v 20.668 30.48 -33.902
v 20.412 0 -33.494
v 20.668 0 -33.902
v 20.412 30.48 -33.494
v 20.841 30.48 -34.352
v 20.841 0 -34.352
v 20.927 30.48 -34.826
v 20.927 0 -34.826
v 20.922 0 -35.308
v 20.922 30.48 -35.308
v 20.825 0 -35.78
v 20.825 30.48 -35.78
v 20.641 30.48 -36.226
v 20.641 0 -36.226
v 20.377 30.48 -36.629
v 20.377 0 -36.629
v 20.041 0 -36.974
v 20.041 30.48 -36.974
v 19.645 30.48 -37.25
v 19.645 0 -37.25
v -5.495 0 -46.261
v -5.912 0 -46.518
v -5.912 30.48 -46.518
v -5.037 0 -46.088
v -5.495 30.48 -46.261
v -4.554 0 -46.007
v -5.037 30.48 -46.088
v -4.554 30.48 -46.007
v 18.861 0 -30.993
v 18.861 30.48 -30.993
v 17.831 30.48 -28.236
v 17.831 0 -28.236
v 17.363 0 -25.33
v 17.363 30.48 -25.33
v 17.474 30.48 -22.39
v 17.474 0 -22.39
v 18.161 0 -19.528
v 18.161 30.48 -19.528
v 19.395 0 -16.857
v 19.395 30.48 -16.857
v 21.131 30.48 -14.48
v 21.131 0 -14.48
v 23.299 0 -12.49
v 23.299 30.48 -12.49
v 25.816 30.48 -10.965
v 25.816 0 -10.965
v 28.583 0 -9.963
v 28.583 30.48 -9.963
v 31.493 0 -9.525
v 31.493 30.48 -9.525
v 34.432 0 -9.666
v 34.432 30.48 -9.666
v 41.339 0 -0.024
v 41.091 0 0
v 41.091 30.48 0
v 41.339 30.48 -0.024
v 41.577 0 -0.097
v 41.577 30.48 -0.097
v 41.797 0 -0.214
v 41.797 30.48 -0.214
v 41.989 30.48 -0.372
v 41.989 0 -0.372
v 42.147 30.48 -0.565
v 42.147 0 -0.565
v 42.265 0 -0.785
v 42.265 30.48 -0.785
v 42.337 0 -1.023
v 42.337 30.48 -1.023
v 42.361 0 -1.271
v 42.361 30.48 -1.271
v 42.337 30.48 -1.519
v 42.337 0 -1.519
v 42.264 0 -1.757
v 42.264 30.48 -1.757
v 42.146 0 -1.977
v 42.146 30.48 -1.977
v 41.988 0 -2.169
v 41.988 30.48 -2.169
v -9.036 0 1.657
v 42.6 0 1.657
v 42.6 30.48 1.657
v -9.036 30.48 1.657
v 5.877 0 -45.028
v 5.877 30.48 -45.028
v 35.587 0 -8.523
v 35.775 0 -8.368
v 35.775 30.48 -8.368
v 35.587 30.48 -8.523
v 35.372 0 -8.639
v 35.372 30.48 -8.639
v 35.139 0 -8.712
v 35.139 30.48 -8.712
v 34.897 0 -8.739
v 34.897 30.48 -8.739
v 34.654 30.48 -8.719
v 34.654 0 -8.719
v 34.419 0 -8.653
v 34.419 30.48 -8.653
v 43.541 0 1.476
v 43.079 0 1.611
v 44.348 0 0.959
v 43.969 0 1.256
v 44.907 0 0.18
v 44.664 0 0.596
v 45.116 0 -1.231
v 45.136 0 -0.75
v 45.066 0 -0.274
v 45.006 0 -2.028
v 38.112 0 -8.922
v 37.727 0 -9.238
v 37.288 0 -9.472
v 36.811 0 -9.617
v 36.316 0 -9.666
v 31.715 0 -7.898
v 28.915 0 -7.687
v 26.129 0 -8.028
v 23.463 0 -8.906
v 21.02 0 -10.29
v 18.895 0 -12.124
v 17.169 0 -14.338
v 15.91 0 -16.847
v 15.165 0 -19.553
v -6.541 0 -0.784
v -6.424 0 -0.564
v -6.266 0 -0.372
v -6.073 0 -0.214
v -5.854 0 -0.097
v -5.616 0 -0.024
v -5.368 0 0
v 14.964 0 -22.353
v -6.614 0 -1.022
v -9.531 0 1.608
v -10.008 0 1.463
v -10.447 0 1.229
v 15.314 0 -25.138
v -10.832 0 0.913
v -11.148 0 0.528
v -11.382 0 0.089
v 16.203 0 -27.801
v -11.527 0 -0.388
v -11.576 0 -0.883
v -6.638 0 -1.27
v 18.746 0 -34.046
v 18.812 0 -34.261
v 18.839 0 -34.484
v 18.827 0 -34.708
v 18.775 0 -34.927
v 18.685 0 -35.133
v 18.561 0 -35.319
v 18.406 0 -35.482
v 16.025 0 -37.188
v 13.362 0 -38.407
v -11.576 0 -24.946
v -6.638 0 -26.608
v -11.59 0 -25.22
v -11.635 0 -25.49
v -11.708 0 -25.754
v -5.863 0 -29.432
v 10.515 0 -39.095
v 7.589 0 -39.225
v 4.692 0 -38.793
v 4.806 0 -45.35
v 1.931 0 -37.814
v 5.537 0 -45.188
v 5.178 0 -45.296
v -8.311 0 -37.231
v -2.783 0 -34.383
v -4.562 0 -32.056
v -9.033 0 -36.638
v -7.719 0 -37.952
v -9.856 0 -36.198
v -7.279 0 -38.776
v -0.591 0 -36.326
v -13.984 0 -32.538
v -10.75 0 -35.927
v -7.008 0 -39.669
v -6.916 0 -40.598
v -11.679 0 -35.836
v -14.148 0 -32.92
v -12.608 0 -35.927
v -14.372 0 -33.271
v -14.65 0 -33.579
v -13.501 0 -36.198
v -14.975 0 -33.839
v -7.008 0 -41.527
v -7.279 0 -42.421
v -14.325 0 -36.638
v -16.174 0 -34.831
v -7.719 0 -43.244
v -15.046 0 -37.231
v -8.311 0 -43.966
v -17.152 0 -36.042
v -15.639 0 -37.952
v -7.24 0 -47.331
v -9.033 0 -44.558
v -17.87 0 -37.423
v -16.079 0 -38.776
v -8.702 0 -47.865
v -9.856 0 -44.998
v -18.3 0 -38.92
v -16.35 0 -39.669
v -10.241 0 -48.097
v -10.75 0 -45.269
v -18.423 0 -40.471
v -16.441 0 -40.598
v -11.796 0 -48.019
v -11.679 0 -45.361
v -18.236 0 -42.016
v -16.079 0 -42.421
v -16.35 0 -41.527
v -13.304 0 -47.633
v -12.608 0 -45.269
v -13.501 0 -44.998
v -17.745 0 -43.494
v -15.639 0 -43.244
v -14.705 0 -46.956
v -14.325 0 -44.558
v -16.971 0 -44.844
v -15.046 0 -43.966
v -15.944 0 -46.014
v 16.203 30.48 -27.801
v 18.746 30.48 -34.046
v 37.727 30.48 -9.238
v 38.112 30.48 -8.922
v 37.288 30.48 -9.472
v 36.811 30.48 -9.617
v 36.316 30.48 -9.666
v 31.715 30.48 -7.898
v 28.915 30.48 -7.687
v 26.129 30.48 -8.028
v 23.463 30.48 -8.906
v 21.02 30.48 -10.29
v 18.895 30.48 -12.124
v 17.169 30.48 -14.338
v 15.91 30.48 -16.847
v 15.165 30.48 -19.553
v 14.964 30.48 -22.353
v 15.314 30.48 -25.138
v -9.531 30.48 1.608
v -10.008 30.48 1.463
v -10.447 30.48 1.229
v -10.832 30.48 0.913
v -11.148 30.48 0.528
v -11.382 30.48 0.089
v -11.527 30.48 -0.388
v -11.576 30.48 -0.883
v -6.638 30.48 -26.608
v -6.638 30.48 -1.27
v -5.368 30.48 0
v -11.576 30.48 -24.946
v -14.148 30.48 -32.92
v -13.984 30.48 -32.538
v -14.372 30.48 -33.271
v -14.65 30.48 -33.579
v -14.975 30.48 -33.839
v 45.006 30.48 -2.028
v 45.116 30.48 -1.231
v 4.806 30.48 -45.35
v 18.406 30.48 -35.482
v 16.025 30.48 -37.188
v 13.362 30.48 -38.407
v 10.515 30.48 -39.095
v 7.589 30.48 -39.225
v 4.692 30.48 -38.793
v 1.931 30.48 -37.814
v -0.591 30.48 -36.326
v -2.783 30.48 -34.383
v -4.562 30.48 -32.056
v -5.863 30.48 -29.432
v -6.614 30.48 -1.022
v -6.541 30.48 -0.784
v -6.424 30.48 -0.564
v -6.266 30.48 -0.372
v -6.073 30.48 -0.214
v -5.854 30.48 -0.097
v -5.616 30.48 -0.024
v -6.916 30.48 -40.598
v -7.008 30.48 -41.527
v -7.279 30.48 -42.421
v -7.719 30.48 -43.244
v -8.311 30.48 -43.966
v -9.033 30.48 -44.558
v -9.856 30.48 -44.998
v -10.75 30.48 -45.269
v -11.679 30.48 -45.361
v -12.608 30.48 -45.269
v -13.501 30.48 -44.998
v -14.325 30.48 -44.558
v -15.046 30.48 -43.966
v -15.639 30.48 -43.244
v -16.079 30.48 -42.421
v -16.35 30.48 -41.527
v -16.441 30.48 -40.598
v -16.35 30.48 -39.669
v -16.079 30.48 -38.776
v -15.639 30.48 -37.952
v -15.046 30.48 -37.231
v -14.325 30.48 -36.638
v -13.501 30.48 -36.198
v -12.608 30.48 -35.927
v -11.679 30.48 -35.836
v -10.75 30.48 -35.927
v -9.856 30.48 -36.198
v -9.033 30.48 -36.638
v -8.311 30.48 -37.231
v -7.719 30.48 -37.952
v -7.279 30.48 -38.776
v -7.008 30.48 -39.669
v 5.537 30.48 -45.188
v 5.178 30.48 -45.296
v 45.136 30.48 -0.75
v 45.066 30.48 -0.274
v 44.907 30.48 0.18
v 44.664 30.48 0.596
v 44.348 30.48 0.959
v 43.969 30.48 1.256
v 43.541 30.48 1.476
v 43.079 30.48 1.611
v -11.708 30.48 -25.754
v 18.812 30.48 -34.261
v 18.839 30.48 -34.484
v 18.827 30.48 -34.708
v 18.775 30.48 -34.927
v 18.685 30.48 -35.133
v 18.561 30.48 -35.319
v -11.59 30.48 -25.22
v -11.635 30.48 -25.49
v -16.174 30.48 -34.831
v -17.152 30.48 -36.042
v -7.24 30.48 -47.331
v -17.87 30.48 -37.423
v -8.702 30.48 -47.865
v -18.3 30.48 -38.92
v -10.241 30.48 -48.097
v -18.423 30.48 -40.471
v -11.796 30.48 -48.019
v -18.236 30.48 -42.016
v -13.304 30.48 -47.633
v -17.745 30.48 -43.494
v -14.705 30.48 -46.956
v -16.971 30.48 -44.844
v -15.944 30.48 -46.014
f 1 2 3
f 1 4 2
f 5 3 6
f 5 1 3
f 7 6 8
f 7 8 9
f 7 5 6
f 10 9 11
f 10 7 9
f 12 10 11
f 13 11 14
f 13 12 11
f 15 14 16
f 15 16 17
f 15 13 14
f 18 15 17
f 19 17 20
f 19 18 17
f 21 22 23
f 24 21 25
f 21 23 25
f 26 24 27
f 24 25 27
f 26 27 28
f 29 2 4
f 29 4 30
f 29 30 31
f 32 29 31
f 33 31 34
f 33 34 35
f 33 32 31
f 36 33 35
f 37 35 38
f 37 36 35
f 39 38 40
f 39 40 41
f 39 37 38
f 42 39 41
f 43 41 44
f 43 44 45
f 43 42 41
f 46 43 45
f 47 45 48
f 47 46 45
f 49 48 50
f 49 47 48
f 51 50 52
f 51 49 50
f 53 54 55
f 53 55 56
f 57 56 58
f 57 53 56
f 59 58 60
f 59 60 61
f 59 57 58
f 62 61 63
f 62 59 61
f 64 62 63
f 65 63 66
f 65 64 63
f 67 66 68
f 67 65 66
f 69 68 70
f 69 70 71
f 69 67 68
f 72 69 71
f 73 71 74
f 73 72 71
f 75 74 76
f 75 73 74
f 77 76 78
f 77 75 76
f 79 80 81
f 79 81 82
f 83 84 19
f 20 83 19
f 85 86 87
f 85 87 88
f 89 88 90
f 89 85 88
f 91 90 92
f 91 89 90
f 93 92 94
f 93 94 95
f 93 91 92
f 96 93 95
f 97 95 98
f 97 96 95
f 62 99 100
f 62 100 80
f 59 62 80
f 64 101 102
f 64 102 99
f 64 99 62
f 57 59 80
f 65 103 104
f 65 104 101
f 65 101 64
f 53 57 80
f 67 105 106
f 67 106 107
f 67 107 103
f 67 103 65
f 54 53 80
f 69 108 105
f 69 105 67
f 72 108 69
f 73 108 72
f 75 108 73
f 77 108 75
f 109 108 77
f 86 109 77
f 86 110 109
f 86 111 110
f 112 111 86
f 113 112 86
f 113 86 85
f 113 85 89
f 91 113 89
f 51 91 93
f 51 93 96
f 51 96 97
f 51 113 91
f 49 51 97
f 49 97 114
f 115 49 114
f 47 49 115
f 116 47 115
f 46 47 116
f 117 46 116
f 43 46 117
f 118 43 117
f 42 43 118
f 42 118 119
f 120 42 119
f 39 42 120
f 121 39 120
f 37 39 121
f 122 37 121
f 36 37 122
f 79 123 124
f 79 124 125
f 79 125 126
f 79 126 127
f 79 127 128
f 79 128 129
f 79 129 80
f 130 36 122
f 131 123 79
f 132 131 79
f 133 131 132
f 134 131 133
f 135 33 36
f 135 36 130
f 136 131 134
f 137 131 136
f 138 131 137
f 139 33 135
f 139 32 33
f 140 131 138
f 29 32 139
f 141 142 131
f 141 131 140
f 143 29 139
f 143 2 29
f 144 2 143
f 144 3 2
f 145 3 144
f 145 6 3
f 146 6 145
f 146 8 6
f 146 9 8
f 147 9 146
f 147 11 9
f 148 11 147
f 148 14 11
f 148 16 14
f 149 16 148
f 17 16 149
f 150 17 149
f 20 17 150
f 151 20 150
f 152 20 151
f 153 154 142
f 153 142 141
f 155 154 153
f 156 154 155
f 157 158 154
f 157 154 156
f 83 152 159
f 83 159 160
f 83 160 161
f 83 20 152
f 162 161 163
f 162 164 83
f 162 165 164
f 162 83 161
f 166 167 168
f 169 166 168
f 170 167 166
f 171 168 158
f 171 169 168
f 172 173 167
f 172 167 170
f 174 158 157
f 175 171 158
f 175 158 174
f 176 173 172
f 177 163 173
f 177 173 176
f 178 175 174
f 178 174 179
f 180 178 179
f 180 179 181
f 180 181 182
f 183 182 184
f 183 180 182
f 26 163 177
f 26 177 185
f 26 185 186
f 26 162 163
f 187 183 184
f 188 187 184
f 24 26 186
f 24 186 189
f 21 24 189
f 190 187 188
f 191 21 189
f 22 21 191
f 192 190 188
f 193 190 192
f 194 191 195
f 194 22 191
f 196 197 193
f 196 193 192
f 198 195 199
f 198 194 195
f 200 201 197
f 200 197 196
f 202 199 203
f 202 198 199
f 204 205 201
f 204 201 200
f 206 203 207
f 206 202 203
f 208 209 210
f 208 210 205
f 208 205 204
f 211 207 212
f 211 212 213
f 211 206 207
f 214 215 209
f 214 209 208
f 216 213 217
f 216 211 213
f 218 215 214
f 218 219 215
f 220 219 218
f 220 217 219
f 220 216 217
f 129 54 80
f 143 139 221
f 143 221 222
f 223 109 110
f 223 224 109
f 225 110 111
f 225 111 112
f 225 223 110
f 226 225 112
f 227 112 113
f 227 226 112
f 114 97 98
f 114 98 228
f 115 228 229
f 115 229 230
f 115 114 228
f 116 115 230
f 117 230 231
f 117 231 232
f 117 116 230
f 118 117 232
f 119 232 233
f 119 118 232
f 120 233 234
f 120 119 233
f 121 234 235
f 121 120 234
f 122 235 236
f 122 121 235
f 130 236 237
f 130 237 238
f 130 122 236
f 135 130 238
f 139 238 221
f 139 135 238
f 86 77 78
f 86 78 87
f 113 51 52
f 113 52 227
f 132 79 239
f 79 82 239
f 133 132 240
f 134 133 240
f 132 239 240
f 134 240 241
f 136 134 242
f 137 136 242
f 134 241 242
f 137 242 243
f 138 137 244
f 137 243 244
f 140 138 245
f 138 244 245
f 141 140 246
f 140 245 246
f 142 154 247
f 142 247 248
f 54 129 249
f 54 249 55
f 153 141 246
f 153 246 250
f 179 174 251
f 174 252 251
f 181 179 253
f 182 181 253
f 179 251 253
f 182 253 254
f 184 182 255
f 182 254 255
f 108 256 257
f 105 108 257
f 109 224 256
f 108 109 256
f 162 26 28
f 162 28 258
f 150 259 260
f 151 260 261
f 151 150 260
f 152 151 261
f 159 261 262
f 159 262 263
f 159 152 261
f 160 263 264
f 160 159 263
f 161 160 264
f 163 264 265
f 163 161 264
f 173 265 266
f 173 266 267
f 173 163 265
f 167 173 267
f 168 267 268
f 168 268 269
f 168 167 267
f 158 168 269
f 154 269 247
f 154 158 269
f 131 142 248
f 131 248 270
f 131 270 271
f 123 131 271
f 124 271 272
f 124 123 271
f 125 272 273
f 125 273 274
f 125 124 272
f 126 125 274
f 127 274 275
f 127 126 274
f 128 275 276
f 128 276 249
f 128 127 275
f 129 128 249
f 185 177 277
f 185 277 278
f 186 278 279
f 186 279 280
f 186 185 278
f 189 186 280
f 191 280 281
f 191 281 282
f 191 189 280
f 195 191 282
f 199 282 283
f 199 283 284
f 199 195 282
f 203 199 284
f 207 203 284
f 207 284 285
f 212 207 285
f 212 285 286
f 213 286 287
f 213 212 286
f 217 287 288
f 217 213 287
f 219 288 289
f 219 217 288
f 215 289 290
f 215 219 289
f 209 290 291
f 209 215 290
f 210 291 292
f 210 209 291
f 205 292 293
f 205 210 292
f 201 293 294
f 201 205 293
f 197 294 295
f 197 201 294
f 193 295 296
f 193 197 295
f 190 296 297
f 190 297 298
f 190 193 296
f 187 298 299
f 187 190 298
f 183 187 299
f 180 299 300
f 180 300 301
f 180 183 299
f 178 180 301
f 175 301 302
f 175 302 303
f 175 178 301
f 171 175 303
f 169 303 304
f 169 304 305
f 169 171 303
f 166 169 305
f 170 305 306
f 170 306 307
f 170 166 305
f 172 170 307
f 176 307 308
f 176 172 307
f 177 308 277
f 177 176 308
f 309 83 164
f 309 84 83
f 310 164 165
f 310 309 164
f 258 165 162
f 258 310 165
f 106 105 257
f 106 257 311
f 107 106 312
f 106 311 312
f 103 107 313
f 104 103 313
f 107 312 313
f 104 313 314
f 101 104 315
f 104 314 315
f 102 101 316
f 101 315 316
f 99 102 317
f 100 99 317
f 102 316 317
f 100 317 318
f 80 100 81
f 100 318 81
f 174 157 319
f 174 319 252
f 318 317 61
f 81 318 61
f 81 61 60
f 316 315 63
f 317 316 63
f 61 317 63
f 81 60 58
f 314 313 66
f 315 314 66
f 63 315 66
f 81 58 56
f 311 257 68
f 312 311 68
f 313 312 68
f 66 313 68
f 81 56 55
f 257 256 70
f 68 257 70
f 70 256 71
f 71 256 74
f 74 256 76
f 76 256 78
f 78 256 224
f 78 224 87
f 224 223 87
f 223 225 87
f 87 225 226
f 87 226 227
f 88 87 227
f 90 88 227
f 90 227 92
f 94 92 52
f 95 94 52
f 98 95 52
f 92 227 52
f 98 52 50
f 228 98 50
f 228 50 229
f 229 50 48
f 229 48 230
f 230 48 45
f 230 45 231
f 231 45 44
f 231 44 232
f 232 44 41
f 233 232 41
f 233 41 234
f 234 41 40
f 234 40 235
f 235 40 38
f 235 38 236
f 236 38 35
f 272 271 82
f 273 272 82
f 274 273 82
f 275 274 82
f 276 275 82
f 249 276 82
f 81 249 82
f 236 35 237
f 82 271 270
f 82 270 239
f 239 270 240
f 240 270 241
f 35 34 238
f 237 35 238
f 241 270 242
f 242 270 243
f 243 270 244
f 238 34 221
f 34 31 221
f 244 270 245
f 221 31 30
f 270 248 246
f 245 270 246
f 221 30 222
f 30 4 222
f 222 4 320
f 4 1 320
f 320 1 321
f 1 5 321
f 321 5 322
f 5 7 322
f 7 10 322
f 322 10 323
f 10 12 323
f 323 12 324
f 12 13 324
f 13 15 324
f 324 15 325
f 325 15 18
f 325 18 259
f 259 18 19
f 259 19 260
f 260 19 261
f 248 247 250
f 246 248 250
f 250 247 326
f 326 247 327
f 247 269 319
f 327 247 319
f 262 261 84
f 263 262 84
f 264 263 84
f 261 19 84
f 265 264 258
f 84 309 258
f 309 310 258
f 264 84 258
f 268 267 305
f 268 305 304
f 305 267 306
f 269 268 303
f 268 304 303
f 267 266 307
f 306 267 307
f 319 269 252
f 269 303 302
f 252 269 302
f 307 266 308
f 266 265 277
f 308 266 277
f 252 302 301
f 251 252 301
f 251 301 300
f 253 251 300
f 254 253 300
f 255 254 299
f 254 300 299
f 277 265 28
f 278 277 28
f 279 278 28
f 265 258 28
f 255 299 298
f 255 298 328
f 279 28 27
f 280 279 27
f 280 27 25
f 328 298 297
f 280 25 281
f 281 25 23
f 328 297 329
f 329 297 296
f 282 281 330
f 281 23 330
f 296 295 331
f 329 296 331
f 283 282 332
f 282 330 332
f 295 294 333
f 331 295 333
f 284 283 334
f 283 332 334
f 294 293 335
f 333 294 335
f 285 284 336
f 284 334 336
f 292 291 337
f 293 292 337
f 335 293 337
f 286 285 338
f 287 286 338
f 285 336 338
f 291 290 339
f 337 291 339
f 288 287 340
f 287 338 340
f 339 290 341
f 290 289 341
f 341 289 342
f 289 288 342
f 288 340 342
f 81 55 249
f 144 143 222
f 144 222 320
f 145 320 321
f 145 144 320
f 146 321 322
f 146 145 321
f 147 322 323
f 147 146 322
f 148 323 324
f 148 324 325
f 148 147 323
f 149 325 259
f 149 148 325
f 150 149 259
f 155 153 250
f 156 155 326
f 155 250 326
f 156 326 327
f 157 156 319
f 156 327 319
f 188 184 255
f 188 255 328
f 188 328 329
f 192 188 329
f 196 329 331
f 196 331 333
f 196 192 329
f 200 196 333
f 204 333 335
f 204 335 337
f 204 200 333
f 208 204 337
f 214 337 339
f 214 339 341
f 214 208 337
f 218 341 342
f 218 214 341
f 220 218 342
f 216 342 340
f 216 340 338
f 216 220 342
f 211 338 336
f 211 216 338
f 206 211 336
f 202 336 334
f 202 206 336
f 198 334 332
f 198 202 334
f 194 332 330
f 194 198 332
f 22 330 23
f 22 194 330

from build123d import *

# Parameters (mm, degrees)
SKETCH1_R           = 4.7625
BOSS_EXTRUDE2_DEPTH = 30.48
FILLET1_R           = 2.54


with BuildPart() as part:
    # Sketch1 → Boss-Extrude2 (new body)
    with BuildSketch(Plane(origin=(0, 0, 0), x_dir=(1, 0, 0), z_dir=(0, 1, 0))):
        with BuildLine():
            Line((45.005946436, 2.027668921), (45.515150945, -1.656575462))
            Line((45.515150945, -1.656575462), (-11.575660389, -1.656575462))
            Line((-11.575660389, -1.656575462), (-11.575660389, 25.36121668))
            Line((-11.575660389, 25.36121668), (-14.280396301, 33.422664026))
            ThreePointArc((-14.280396301, 33.422664026), (-17.000257473, 44.802695642), (-5.367910813, 46.064153357))
            Line((-5.367910813, 46.064153357), (5.377854414, 45.31005212))
            Line((5.377854414, 45.31005212), (22.451182043, 35.66511967))
            ThreePointArc((22.451182043, 35.66511967), (18.704388059, 18.178130753), (34.432464589, 9.665736544))
            Line((34.432464589, 9.665736544), (37.367878813, 9.665736544))
            Line((37.367878813, 9.665736544), (45.005946436, 2.027668921))
        make_face()
        with Locations((-11.678835755, 40.598351677)):
            Circle(SKETCH1_R, mode=Mode.SUBTRACT)
        with BuildLine():
            Line((16.202668925, 27.801375987), (18.746230839, 34.046195278))
            ThreePointArc((18.746230839, 34.046195278), (18.80575079, 34.818433424), (18.405670977, 35.481630621))
            ThreePointArc((18.405670977, 35.481630621), (3.288167743, 38.370043483), (-6.637910813, 26.607611872))
            Line((-6.637910813, 26.607611872), (-6.637910813, 1.27))
            ThreePointArc((-6.637910813, 1.27), (-6.265936425, 0.371974388), (-5.367910813, 0))
            Line((-5.367910813, 0), (41.091115974, 0))
            ThreePointArc((41.091115974, 0), (42.264718256, 0.784657148), (41.988123028, 2.169043017))
            Line((41.988123028, 2.169043017), (35.775365429, 8.367731265))
            ThreePointArc((35.775365429, 8.367731265), (35.139277633, 8.711596588), (34.418608086, 8.652550432))
            ThreePointArc((34.418608086, 8.652550432), (18.894618686, 12.123517004), (16.202668925, 27.801375987))
        make_face(mode=Mode.SUBTRACT)
    extrude(amount=BOSS_EXTRUDE2_DEPTH)

    # Fillet1
    fillet1_edges = [part.edges().sort_by_distance(p)[0] for p in [
        (45.515150945, 15.24, 1.656575462),
        (-11.575660389, 15.24, 1.656575462),
        (-11.575660389, 15.24, -25.36121668),
        (-14.280396301, 15.24, -33.422664026),
        (-5.367910813, 15.24, -46.064153357),
        (5.377854414, 15.24, -45.31005212),
        (22.451182043, 15.24, -35.66511967),
        (37.367878813, 15.24, -9.665736544),
    ]]
    fillet(fillet1_edges, radius=FILLET1_R)


solid = part.part
